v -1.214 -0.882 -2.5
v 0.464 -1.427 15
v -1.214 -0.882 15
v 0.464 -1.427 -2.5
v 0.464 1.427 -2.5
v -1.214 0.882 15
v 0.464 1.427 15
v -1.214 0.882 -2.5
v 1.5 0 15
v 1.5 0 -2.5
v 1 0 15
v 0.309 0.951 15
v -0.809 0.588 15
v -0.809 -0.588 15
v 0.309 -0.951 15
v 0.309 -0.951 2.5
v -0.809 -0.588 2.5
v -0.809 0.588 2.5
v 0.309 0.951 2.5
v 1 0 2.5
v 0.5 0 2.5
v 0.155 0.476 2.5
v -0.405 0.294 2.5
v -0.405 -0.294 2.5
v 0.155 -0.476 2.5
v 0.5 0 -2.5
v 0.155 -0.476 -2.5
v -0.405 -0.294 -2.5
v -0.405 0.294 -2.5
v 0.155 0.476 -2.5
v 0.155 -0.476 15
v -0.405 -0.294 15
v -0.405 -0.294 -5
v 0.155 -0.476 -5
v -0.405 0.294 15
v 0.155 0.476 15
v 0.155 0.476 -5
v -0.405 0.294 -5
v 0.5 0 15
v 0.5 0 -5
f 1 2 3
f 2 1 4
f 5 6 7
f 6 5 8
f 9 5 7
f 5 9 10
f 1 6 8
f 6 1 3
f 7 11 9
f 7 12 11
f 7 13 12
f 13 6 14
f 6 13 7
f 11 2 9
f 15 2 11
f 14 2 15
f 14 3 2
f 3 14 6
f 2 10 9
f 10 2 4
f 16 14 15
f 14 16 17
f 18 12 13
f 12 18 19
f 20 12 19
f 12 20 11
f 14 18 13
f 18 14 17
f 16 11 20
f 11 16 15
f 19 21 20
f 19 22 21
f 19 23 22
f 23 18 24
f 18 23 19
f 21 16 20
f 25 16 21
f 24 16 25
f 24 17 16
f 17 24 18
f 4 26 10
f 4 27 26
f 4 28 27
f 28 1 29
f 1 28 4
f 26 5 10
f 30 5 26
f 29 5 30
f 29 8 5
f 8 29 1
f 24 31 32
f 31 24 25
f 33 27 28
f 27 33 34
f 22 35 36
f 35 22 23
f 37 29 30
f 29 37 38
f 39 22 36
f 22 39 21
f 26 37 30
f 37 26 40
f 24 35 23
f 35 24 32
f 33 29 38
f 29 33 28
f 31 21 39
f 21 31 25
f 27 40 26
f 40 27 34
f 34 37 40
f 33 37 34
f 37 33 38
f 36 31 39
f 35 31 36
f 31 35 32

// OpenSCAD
// Parameters
length = 15; //[8:30:1]
center = 1; //[0:1:1]
forced_id = 0; //[0:10:0.1]
default_id = 2; //[1:6:0.1]
wall_thickness = 0.5; //[0.25:1.5:0.05]
eps_overlap = 0.8; //[0.5:2:0.1]

// Tubing - complete geometry
module tubing() {
  color([0.85, 0.85, 0.8]) { // Off-white for PTFE
    difference() {
      // Outer tube
      cylinder(h=length, r=((forced_id > 0 ? forced_id : default_id) / 2) + wall_thickness, center=center);
      // Inner bore
      cylinder(h=length + 2 * eps_overlap, r=(forced_id > 0 ? forced_id : default_id) / 2, center=center);
    }
  }
}

// Sleeved Resistor - complete geometry
module sleeved_resistor() {
  color([0.2, 0.2, 0.2]) { // Dark color for resistor
    // Resistor body
    cylinder(h=5, r=1.5, center=true); // Assuming a small resistor
    // Leads
    translate([0, 0, -5]) cylinder(h=10, r=0.5, center=false); // Lead on one side
    translate([0, 0, 5]) cylinder(h=10, r=0.5, center=false); // Lead on the other side
  }
}

// Assembly
module assembly() {
  translate([0, 0, center ? 0 : length / 2]) tubing();
  translate([0, 0, center ? 0 : length / 2]) sleeved_resistor();
}

assembly();
